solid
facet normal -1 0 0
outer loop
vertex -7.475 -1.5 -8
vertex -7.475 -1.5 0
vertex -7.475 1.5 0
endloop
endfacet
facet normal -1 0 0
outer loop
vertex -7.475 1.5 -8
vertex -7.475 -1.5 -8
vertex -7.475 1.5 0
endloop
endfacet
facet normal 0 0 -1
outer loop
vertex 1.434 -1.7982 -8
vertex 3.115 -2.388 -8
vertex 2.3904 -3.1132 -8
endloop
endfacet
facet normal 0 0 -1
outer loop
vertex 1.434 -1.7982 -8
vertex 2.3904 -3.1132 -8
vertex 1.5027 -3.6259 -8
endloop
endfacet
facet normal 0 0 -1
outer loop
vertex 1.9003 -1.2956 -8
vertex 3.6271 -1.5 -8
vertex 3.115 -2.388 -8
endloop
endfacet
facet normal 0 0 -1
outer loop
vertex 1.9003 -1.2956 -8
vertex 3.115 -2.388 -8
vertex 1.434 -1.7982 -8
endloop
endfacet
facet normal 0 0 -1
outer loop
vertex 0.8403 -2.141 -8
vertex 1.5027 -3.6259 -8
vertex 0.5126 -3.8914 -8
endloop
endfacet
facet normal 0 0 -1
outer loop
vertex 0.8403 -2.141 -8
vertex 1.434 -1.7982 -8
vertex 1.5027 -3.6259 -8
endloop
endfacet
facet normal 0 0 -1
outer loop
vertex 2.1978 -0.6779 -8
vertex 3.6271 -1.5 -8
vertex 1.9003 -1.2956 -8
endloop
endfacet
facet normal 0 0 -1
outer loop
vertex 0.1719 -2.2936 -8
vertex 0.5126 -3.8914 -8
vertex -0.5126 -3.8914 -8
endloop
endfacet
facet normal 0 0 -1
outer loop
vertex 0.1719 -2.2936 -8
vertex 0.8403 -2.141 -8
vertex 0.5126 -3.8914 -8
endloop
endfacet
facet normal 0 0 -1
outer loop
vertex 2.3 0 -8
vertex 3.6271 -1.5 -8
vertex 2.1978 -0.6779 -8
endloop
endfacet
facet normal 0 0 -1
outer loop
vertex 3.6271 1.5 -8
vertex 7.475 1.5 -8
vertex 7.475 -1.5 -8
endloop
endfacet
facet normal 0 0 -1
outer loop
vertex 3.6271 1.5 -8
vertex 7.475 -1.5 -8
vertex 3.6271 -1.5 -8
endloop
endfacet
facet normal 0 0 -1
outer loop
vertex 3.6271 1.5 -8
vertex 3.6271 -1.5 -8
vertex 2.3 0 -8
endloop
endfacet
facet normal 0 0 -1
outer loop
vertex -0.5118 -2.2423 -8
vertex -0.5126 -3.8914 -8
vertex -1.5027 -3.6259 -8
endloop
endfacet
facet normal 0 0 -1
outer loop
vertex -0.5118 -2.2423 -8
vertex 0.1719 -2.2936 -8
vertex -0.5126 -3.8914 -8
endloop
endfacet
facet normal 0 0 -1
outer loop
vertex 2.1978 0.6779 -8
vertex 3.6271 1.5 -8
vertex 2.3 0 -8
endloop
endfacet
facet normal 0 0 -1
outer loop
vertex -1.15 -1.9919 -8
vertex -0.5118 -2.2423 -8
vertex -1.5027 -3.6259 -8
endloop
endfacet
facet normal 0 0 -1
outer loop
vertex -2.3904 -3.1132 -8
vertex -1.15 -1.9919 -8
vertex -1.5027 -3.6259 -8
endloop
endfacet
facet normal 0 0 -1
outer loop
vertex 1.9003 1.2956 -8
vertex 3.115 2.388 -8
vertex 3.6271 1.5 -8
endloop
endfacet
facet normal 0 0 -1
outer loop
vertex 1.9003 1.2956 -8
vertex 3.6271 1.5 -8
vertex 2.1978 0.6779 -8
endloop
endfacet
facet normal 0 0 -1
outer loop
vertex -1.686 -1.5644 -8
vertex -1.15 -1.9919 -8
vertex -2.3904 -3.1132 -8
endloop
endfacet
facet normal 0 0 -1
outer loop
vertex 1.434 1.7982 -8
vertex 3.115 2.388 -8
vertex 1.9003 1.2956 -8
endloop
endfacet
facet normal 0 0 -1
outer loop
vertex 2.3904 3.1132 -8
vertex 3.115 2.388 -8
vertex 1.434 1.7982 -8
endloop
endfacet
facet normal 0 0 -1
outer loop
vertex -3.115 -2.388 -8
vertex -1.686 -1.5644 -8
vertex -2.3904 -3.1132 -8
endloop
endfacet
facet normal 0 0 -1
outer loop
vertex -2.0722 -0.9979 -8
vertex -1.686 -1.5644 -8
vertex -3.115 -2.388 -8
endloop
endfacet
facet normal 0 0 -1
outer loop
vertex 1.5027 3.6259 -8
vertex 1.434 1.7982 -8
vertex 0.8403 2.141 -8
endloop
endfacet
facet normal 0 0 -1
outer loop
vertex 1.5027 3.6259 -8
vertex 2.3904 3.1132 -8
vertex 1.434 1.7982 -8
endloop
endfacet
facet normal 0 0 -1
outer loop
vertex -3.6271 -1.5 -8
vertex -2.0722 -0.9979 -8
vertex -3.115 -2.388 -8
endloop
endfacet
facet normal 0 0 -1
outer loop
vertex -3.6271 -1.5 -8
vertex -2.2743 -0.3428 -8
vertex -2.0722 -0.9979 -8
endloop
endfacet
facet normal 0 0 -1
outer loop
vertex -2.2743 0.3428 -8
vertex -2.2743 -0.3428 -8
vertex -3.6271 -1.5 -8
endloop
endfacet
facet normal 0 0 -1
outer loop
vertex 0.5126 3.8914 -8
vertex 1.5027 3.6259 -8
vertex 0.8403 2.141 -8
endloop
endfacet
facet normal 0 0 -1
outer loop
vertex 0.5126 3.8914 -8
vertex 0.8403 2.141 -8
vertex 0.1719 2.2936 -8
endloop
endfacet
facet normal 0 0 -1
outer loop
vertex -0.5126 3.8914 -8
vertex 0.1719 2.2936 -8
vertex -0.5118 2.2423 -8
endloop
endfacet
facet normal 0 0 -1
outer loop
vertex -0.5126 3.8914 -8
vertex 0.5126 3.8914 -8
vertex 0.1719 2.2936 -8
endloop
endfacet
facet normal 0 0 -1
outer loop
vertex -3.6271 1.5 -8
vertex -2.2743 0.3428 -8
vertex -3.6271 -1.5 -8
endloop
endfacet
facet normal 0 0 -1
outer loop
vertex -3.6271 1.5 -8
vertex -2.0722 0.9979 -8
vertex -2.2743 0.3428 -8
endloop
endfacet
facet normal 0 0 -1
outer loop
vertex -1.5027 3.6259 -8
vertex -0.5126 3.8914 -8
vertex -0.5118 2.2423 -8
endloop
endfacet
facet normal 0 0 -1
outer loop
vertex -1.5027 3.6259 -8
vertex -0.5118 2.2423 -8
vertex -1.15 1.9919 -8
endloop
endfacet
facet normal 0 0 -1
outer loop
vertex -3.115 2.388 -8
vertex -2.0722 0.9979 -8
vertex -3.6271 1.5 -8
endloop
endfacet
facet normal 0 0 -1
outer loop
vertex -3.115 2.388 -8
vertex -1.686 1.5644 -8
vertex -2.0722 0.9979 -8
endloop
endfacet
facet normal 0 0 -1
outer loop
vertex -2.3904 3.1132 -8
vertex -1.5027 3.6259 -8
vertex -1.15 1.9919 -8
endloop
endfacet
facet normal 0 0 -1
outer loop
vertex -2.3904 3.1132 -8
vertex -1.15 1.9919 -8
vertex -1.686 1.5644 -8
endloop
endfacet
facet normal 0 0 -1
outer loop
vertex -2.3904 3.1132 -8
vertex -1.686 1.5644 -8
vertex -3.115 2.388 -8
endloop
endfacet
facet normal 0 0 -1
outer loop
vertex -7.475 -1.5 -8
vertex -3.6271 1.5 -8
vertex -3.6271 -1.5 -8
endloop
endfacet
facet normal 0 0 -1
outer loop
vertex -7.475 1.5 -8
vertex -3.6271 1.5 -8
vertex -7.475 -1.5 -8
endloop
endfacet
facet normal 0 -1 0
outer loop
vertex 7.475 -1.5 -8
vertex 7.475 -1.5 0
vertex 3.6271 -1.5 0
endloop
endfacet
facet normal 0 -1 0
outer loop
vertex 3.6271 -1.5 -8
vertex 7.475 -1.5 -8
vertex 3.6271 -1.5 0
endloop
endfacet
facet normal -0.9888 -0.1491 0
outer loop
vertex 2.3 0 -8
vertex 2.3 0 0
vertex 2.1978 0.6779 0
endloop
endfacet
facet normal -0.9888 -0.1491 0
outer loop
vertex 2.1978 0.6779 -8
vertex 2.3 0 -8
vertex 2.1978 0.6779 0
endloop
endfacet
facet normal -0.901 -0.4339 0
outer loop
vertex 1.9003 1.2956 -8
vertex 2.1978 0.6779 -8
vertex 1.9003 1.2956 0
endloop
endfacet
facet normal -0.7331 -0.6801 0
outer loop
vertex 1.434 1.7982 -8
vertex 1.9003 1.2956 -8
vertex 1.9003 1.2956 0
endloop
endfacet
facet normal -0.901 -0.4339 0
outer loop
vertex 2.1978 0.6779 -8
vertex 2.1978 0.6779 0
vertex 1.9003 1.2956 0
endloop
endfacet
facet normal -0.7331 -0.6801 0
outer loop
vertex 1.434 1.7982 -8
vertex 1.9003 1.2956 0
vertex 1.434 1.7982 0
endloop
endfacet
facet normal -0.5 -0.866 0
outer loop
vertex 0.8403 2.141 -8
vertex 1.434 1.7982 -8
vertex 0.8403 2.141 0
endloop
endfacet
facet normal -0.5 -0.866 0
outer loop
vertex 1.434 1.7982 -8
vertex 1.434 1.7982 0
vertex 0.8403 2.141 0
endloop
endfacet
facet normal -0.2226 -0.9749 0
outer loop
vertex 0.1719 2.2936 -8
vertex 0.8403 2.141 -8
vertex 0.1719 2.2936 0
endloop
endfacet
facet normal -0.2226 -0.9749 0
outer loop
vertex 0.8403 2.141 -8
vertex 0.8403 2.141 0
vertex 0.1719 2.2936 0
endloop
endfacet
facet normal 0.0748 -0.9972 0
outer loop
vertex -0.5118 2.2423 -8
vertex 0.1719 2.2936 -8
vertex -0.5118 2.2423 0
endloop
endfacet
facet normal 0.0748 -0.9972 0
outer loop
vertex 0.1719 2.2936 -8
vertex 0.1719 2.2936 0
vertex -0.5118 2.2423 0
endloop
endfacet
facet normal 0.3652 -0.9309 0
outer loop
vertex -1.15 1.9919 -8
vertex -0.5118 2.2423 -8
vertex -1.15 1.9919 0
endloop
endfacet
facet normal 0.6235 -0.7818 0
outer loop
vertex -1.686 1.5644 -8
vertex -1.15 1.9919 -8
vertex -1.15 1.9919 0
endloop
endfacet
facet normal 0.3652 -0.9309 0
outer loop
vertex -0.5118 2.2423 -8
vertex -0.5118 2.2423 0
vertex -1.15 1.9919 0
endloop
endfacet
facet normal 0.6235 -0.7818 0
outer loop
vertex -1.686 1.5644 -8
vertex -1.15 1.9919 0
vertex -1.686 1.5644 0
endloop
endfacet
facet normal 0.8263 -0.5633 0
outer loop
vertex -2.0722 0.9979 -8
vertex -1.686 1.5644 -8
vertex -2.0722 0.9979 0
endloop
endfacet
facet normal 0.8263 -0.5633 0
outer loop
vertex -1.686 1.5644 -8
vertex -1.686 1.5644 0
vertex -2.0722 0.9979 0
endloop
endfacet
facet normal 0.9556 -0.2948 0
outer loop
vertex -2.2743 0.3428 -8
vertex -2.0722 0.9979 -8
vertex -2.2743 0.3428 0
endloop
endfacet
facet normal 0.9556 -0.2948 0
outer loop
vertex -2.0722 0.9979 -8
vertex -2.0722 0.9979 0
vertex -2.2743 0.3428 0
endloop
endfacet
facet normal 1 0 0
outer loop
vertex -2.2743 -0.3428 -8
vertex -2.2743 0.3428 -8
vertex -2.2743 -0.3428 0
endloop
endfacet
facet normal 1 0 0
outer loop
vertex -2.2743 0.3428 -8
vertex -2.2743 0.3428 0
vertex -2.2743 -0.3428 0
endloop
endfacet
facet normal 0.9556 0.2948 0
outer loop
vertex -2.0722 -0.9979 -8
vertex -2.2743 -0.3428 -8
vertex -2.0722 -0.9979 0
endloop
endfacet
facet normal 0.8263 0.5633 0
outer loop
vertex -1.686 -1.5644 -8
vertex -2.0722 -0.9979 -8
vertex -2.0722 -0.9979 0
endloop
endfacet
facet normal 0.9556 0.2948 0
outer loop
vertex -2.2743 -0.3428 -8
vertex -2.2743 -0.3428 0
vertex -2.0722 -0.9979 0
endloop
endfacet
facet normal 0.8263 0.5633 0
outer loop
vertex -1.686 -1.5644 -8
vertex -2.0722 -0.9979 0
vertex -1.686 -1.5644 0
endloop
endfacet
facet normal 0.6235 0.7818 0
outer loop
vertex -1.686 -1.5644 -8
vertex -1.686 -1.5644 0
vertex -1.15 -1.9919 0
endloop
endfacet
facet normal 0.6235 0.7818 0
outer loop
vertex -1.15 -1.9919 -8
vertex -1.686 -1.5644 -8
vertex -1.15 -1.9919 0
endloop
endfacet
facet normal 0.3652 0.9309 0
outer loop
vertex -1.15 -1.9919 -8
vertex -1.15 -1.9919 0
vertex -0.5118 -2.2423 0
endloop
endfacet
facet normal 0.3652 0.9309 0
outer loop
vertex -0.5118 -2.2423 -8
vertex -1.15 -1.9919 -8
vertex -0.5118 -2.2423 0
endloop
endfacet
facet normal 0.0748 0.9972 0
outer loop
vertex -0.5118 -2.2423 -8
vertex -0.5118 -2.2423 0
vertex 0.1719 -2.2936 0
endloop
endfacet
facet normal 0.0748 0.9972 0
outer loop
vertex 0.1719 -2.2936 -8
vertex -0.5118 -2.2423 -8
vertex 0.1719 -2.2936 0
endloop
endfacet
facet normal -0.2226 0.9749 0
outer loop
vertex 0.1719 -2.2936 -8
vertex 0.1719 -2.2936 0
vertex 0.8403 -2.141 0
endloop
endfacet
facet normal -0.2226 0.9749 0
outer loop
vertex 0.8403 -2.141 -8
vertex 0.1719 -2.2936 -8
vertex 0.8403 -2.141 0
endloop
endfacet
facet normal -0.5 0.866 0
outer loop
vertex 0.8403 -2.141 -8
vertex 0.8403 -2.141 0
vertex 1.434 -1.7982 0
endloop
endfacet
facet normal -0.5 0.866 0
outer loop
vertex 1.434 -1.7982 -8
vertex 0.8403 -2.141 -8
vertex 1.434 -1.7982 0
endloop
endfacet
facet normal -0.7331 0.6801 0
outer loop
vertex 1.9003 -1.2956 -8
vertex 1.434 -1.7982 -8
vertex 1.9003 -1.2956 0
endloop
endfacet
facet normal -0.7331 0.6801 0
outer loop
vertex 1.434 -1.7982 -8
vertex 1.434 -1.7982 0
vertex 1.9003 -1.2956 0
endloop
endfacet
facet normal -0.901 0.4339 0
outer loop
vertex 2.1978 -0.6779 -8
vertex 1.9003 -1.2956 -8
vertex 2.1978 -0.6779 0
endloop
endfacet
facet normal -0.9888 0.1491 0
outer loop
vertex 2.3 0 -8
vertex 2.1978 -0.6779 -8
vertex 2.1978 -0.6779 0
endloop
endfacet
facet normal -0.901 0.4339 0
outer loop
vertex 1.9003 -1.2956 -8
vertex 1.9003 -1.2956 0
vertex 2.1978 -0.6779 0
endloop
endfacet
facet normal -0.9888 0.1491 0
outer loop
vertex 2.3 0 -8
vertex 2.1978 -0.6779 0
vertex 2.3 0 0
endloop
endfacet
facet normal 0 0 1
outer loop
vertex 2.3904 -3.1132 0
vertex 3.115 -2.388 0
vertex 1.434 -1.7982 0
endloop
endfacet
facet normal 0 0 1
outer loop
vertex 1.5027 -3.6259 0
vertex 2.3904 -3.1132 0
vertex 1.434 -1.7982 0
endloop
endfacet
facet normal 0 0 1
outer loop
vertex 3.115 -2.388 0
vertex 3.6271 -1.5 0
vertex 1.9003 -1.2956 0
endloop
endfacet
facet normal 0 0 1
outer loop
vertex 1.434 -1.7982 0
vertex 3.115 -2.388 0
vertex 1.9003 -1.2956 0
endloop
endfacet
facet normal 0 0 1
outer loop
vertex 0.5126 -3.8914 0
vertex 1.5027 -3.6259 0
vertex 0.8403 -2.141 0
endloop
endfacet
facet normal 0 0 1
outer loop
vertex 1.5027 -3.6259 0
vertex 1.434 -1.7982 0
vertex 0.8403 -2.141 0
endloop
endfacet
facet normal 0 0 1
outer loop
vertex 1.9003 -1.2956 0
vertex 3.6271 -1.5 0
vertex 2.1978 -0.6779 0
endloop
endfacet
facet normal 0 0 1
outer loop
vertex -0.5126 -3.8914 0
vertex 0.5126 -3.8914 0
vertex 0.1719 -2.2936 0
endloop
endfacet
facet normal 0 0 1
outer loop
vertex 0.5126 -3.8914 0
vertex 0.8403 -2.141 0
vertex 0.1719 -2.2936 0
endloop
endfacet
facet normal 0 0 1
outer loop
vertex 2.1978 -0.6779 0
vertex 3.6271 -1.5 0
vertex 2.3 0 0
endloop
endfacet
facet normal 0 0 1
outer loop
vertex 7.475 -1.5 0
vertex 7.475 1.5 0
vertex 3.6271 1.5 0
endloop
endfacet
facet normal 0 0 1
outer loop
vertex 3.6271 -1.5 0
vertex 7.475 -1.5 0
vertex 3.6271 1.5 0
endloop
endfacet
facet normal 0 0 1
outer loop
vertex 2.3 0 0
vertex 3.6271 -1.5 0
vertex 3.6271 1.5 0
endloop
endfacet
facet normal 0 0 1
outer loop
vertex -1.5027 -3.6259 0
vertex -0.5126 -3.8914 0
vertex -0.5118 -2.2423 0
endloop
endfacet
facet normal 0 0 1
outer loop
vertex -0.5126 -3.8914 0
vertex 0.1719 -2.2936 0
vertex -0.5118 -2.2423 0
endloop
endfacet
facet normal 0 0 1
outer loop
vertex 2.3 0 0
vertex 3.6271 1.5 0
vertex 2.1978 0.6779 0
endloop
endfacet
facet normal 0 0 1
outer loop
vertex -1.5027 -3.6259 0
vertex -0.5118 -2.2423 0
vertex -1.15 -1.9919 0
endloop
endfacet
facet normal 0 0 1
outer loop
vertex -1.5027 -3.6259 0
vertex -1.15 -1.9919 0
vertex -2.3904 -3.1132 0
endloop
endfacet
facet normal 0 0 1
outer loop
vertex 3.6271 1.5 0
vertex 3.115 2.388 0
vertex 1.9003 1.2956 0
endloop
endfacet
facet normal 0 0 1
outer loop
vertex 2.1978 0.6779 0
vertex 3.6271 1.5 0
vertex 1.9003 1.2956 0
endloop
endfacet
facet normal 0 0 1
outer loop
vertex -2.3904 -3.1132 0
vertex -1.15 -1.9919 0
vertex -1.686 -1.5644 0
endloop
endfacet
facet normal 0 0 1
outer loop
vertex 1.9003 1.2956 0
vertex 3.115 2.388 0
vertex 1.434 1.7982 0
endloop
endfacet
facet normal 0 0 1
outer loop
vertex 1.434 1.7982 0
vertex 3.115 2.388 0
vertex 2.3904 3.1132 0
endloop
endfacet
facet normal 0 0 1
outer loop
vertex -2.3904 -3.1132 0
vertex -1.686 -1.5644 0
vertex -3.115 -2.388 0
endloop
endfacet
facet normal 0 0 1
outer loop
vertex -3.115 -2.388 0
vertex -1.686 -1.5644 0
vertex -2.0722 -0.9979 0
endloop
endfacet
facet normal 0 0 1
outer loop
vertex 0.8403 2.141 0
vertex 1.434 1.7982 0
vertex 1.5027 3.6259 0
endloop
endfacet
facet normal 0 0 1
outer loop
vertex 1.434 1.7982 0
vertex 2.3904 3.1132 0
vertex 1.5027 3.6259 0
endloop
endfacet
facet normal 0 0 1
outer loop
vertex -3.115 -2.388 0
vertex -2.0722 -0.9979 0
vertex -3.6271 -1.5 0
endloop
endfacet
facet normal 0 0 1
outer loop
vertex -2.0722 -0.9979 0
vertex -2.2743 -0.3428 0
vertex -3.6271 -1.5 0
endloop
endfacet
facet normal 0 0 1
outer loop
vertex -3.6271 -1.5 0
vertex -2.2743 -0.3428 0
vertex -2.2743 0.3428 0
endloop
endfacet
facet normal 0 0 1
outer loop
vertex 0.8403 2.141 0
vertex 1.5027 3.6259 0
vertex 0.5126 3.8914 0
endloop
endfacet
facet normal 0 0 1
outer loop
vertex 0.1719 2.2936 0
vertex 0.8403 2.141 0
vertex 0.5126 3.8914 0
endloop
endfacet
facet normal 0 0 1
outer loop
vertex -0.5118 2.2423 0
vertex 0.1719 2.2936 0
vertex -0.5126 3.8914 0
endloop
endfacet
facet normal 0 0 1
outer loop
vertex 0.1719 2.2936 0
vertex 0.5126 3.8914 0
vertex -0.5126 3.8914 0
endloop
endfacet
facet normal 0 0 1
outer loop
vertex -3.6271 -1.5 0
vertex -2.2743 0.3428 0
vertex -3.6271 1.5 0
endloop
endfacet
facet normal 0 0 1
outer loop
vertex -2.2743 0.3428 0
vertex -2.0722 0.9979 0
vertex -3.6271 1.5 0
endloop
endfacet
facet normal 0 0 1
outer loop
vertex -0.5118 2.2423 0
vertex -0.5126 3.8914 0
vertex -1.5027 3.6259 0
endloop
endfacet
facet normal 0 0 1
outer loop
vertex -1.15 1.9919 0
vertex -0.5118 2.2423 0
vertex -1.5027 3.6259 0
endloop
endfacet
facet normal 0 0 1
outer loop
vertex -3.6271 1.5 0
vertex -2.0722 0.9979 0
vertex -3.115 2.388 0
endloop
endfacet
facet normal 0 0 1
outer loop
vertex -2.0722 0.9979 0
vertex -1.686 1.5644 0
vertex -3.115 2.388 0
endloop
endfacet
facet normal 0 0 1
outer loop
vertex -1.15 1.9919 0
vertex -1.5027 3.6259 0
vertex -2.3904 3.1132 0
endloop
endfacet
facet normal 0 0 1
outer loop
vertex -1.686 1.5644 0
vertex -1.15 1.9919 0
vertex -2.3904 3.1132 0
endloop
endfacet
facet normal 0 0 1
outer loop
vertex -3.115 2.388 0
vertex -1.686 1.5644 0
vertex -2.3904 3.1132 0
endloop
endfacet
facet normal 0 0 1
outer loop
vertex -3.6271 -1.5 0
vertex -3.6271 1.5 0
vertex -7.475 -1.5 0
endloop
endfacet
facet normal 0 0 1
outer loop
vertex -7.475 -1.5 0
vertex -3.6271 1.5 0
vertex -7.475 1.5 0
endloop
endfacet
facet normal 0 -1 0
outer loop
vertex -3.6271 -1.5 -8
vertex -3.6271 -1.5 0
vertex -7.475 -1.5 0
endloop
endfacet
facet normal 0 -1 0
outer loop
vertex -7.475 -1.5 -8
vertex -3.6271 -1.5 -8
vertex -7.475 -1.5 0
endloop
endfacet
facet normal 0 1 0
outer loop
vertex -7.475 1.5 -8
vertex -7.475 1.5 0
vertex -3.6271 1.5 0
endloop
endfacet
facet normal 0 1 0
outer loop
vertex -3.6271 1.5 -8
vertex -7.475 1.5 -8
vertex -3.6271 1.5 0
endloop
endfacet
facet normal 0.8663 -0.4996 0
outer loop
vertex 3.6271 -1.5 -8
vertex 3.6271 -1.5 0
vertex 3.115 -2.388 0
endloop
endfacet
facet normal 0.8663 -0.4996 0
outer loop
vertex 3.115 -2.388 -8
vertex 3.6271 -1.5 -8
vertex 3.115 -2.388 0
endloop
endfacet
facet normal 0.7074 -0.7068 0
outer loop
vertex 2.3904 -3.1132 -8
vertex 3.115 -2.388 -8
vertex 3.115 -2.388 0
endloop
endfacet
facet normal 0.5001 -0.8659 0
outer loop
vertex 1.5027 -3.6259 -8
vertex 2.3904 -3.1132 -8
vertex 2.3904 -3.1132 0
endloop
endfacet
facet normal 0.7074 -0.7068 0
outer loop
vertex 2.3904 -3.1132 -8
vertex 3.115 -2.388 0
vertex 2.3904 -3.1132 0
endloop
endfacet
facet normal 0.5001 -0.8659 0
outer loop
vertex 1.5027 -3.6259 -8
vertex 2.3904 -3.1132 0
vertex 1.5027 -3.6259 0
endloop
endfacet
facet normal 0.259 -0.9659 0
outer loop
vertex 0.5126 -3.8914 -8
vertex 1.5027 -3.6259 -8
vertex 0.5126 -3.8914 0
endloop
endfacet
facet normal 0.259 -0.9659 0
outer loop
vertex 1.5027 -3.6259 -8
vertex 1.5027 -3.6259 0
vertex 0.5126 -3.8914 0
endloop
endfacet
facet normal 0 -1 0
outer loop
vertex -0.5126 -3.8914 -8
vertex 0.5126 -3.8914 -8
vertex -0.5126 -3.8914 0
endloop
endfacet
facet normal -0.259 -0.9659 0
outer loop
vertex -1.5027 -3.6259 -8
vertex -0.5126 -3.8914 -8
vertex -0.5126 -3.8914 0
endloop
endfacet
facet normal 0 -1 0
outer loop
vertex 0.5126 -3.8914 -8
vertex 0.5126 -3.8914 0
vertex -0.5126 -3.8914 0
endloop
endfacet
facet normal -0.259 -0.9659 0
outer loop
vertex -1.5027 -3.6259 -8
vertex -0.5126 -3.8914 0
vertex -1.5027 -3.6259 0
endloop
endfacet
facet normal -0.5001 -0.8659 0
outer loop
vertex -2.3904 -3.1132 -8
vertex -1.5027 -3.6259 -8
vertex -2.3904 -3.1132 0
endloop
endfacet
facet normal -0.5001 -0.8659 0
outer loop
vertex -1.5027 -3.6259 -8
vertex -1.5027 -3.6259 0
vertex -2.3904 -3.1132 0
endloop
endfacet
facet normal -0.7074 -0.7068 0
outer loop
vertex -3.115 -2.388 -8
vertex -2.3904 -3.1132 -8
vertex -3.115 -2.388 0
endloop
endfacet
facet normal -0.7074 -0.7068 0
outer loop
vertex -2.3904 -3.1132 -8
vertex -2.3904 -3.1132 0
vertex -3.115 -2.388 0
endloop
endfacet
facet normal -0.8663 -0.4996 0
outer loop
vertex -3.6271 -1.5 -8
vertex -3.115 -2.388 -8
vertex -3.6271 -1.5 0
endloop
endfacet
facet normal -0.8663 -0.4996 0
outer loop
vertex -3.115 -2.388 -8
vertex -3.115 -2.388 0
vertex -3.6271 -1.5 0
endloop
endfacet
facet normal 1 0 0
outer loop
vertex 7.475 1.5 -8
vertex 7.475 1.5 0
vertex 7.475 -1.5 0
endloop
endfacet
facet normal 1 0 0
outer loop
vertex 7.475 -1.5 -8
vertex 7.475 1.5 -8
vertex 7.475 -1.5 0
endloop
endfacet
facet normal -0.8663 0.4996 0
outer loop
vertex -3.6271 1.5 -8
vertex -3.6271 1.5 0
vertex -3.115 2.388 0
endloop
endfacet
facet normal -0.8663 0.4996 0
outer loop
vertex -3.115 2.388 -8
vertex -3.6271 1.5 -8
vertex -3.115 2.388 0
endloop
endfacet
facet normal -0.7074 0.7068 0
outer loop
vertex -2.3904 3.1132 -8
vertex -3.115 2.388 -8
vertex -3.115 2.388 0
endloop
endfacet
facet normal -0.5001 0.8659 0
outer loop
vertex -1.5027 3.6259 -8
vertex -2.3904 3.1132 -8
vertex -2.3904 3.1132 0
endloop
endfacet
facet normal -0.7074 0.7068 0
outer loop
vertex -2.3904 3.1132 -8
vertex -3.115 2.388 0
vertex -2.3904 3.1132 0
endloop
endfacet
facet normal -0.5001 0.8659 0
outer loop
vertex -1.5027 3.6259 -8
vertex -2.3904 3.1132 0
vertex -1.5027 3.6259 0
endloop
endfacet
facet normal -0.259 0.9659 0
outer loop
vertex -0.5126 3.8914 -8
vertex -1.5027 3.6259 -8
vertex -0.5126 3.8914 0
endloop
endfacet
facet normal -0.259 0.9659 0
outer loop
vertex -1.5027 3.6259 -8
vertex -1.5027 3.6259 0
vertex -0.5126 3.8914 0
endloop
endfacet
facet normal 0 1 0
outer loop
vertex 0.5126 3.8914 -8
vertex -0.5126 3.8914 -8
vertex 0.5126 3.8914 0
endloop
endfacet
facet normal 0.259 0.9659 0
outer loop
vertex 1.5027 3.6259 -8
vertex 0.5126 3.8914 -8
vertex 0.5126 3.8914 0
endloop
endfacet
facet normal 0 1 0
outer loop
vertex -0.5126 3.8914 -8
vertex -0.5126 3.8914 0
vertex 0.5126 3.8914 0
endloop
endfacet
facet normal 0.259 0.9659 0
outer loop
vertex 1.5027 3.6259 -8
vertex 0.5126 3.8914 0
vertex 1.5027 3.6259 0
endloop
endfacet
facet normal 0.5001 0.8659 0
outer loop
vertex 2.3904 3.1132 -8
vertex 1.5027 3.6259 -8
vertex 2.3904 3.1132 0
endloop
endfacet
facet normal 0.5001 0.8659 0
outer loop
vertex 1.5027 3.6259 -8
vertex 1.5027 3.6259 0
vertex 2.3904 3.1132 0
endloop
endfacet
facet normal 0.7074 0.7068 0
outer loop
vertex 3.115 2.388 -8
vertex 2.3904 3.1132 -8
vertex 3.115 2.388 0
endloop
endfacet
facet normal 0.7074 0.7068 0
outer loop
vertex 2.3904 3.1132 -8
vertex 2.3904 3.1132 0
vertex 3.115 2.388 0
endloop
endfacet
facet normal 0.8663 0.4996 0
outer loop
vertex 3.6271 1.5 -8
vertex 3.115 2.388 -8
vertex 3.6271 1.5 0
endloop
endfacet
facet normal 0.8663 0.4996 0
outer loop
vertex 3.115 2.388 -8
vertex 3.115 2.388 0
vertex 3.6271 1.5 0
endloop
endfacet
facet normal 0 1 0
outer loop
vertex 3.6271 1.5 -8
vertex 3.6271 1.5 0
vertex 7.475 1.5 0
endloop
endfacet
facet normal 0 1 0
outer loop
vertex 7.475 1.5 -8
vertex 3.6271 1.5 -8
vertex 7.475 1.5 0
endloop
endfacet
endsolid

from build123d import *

# Parameters (mm, degrees)
CROQUIS1_R              = 2.3
SALIENTE_EXTRUIR1_DEPTH = 8


with BuildPart() as part:
    # Croquis1 → Saliente-Extruir1 (new body)
    with BuildSketch(Plane.XY):
        with BuildLine():
            Line((3.627068375, 1.5), (7.475, 1.5))
            Line((7.475, 1.5), (7.475, -1.5))
            Line((7.475, -1.5), (3.627068375, -1.5))
            ThreePointArc((3.627068375, -1.5), (0, -3.925), (-3.627068375, -1.5))
            Line((-3.627068375, -1.5), (-7.475, -1.5))
            Line((-7.475, -1.5), (-7.475, 1.5))
            Line((-7.475, 1.5), (-3.627068375, 1.5))
            ThreePointArc((-3.627068375, 1.5), (0, 3.925), (3.627068375, 1.5))
        make_face()
        Circle(CROQUIS1_R, mode=Mode.SUBTRACT)
    extrude(amount=-SALIENTE_EXTRUIR1_DEPTH)


solid = part.part
